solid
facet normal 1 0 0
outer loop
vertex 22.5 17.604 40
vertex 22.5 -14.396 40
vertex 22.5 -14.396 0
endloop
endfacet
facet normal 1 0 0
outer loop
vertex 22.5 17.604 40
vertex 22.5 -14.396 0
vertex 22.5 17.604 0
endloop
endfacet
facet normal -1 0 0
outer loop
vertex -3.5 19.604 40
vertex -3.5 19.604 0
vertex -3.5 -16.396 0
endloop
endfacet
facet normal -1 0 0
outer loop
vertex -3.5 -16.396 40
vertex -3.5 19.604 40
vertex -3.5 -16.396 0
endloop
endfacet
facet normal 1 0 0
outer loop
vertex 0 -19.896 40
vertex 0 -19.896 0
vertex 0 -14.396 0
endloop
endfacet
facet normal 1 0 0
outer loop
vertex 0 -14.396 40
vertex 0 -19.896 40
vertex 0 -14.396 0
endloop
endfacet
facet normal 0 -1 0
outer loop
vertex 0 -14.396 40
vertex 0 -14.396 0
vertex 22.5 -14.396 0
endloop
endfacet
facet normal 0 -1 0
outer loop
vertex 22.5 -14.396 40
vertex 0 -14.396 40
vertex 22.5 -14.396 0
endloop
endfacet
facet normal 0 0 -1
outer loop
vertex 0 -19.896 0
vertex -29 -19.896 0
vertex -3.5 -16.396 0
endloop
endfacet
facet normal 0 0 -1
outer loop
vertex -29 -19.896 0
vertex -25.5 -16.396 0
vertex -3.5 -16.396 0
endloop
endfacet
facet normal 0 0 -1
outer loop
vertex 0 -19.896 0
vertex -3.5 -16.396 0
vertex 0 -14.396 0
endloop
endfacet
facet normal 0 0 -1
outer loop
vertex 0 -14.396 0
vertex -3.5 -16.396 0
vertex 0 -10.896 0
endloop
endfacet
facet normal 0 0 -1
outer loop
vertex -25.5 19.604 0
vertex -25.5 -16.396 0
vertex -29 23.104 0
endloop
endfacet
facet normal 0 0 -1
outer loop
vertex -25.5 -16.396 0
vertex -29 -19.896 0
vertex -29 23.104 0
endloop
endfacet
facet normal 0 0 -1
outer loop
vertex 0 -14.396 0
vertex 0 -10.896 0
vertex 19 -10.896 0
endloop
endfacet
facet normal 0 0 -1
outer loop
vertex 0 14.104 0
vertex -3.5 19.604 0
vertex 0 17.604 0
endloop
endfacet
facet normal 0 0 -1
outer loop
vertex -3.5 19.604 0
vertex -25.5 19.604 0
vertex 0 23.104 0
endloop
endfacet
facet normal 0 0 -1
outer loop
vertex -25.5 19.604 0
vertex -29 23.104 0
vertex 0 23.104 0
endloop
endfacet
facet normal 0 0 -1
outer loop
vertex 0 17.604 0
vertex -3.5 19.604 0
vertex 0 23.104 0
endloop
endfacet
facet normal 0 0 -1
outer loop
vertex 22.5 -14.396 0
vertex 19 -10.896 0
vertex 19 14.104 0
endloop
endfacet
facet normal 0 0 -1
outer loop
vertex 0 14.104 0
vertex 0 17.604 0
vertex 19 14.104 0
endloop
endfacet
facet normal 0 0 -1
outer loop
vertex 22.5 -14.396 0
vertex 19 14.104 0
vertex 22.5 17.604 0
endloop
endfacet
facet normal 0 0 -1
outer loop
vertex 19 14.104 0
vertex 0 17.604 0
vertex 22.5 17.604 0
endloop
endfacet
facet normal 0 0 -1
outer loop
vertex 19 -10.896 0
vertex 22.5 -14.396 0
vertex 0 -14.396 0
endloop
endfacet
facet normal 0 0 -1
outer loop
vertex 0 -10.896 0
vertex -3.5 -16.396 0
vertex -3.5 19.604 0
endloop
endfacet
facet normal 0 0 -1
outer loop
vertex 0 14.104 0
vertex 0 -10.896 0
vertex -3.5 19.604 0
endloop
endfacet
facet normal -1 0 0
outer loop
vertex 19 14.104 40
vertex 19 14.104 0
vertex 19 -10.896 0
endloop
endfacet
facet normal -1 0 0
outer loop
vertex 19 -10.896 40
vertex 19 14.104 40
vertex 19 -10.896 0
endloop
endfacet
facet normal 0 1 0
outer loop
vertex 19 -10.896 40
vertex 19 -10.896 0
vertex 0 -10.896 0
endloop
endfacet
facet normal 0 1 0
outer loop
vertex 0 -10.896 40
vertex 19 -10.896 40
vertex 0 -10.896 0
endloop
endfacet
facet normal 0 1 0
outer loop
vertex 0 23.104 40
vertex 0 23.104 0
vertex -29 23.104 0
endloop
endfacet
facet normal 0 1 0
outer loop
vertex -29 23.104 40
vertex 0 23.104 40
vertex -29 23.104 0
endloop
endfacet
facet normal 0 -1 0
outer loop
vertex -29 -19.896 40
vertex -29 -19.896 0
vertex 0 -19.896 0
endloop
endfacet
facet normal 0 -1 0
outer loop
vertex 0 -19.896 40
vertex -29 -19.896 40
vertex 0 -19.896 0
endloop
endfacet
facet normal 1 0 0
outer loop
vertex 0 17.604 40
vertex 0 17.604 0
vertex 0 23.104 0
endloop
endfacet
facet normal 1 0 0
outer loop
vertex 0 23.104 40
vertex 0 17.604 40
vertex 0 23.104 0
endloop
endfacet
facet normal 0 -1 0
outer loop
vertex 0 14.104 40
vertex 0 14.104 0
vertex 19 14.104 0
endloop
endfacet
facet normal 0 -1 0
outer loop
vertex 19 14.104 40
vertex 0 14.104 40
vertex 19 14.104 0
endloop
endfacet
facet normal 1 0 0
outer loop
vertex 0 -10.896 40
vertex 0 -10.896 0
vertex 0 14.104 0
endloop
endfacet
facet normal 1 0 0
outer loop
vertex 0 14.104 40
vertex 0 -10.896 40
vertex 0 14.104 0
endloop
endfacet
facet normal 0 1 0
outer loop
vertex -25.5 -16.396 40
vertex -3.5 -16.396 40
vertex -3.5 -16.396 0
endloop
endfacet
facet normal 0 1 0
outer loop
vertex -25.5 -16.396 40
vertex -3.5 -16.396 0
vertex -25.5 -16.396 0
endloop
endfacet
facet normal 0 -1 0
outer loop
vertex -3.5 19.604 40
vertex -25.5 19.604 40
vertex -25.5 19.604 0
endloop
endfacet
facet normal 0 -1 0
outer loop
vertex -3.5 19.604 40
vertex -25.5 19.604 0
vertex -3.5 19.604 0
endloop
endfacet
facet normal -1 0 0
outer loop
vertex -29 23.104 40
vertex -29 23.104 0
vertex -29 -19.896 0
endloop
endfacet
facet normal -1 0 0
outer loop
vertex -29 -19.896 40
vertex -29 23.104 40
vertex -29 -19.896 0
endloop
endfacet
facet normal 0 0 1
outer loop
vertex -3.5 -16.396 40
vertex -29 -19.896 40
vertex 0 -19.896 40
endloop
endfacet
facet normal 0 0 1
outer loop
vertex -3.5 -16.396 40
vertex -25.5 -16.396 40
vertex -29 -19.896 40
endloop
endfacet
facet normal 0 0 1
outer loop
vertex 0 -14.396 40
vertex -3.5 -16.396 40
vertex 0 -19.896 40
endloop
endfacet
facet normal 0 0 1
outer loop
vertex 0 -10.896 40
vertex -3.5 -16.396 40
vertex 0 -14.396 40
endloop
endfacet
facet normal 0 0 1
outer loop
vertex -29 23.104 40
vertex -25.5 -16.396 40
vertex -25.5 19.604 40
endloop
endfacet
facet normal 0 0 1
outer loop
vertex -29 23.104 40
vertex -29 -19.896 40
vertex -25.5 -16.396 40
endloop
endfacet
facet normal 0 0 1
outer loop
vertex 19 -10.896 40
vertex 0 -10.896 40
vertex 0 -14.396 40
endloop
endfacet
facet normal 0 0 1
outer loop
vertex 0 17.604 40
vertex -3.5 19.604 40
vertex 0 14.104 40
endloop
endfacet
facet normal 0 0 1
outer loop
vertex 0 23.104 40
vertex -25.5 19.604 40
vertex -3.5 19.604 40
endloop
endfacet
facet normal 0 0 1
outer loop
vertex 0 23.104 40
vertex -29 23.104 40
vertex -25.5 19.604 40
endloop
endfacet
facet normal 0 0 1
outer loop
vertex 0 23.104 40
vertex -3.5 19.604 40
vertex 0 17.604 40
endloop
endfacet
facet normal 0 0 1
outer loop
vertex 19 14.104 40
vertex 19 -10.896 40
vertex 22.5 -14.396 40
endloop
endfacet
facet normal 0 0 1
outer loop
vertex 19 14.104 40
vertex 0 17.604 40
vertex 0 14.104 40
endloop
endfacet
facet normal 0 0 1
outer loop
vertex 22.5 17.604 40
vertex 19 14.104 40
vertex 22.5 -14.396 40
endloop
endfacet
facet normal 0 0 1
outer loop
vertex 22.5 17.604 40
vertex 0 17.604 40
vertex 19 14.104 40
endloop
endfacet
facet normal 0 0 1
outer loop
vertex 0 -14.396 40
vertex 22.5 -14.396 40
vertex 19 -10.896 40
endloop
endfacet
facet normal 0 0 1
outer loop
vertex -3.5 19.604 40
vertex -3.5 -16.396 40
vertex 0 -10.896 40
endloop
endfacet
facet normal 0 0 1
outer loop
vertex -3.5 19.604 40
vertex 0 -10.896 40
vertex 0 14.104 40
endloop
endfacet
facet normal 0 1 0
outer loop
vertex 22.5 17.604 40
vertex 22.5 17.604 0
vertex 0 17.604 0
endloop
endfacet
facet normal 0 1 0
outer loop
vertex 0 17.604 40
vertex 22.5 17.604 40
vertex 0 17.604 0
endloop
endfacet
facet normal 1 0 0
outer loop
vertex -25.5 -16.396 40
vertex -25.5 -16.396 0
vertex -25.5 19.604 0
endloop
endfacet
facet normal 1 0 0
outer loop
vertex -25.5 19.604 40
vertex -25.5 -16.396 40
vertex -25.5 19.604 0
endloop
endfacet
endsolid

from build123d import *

# Parameters (mm, degrees)
F1_DEPTH = 40


with BuildPart() as f1:
    # F0 (on Top) → F1 (new body)
    with BuildSketch(Plane.XY):
        Polygon((22.5, 17.604167), (0, 17.604167), (0, 22.416667), (0, 23.104167), (-3.5, 23.104167), (-25.5, 23.104167), (-29, 23.104167), (-29, 19.604167), (-29, -8.020833), (-29, -16.395833), (-29, -19.895833), (-25.5, -19.895833), (-3.5, -19.895833), (0, -19.895833), (0, -14.395833), (22.5, -14.395833), align=None)
        Polygon((-3.5, 17.604167), (-3.5, -14.395833), (-3.5, -16.395833), (-25.5, -16.395833), (-25.5, -8.020833), (-25.5, 11.229167), (-25.5, 19.604167), (-3.5, 19.604167), align=None, mode=Mode.SUBTRACT)
        Polygon((19, -10.895833), (0, -10.895833), (0, -10.883333), (0, -8.770833), (0, 14.104167), (19, 14.104167), align=None, mode=Mode.SUBTRACT)
    extrude(amount=F1_DEPTH)


solid = f1.part
